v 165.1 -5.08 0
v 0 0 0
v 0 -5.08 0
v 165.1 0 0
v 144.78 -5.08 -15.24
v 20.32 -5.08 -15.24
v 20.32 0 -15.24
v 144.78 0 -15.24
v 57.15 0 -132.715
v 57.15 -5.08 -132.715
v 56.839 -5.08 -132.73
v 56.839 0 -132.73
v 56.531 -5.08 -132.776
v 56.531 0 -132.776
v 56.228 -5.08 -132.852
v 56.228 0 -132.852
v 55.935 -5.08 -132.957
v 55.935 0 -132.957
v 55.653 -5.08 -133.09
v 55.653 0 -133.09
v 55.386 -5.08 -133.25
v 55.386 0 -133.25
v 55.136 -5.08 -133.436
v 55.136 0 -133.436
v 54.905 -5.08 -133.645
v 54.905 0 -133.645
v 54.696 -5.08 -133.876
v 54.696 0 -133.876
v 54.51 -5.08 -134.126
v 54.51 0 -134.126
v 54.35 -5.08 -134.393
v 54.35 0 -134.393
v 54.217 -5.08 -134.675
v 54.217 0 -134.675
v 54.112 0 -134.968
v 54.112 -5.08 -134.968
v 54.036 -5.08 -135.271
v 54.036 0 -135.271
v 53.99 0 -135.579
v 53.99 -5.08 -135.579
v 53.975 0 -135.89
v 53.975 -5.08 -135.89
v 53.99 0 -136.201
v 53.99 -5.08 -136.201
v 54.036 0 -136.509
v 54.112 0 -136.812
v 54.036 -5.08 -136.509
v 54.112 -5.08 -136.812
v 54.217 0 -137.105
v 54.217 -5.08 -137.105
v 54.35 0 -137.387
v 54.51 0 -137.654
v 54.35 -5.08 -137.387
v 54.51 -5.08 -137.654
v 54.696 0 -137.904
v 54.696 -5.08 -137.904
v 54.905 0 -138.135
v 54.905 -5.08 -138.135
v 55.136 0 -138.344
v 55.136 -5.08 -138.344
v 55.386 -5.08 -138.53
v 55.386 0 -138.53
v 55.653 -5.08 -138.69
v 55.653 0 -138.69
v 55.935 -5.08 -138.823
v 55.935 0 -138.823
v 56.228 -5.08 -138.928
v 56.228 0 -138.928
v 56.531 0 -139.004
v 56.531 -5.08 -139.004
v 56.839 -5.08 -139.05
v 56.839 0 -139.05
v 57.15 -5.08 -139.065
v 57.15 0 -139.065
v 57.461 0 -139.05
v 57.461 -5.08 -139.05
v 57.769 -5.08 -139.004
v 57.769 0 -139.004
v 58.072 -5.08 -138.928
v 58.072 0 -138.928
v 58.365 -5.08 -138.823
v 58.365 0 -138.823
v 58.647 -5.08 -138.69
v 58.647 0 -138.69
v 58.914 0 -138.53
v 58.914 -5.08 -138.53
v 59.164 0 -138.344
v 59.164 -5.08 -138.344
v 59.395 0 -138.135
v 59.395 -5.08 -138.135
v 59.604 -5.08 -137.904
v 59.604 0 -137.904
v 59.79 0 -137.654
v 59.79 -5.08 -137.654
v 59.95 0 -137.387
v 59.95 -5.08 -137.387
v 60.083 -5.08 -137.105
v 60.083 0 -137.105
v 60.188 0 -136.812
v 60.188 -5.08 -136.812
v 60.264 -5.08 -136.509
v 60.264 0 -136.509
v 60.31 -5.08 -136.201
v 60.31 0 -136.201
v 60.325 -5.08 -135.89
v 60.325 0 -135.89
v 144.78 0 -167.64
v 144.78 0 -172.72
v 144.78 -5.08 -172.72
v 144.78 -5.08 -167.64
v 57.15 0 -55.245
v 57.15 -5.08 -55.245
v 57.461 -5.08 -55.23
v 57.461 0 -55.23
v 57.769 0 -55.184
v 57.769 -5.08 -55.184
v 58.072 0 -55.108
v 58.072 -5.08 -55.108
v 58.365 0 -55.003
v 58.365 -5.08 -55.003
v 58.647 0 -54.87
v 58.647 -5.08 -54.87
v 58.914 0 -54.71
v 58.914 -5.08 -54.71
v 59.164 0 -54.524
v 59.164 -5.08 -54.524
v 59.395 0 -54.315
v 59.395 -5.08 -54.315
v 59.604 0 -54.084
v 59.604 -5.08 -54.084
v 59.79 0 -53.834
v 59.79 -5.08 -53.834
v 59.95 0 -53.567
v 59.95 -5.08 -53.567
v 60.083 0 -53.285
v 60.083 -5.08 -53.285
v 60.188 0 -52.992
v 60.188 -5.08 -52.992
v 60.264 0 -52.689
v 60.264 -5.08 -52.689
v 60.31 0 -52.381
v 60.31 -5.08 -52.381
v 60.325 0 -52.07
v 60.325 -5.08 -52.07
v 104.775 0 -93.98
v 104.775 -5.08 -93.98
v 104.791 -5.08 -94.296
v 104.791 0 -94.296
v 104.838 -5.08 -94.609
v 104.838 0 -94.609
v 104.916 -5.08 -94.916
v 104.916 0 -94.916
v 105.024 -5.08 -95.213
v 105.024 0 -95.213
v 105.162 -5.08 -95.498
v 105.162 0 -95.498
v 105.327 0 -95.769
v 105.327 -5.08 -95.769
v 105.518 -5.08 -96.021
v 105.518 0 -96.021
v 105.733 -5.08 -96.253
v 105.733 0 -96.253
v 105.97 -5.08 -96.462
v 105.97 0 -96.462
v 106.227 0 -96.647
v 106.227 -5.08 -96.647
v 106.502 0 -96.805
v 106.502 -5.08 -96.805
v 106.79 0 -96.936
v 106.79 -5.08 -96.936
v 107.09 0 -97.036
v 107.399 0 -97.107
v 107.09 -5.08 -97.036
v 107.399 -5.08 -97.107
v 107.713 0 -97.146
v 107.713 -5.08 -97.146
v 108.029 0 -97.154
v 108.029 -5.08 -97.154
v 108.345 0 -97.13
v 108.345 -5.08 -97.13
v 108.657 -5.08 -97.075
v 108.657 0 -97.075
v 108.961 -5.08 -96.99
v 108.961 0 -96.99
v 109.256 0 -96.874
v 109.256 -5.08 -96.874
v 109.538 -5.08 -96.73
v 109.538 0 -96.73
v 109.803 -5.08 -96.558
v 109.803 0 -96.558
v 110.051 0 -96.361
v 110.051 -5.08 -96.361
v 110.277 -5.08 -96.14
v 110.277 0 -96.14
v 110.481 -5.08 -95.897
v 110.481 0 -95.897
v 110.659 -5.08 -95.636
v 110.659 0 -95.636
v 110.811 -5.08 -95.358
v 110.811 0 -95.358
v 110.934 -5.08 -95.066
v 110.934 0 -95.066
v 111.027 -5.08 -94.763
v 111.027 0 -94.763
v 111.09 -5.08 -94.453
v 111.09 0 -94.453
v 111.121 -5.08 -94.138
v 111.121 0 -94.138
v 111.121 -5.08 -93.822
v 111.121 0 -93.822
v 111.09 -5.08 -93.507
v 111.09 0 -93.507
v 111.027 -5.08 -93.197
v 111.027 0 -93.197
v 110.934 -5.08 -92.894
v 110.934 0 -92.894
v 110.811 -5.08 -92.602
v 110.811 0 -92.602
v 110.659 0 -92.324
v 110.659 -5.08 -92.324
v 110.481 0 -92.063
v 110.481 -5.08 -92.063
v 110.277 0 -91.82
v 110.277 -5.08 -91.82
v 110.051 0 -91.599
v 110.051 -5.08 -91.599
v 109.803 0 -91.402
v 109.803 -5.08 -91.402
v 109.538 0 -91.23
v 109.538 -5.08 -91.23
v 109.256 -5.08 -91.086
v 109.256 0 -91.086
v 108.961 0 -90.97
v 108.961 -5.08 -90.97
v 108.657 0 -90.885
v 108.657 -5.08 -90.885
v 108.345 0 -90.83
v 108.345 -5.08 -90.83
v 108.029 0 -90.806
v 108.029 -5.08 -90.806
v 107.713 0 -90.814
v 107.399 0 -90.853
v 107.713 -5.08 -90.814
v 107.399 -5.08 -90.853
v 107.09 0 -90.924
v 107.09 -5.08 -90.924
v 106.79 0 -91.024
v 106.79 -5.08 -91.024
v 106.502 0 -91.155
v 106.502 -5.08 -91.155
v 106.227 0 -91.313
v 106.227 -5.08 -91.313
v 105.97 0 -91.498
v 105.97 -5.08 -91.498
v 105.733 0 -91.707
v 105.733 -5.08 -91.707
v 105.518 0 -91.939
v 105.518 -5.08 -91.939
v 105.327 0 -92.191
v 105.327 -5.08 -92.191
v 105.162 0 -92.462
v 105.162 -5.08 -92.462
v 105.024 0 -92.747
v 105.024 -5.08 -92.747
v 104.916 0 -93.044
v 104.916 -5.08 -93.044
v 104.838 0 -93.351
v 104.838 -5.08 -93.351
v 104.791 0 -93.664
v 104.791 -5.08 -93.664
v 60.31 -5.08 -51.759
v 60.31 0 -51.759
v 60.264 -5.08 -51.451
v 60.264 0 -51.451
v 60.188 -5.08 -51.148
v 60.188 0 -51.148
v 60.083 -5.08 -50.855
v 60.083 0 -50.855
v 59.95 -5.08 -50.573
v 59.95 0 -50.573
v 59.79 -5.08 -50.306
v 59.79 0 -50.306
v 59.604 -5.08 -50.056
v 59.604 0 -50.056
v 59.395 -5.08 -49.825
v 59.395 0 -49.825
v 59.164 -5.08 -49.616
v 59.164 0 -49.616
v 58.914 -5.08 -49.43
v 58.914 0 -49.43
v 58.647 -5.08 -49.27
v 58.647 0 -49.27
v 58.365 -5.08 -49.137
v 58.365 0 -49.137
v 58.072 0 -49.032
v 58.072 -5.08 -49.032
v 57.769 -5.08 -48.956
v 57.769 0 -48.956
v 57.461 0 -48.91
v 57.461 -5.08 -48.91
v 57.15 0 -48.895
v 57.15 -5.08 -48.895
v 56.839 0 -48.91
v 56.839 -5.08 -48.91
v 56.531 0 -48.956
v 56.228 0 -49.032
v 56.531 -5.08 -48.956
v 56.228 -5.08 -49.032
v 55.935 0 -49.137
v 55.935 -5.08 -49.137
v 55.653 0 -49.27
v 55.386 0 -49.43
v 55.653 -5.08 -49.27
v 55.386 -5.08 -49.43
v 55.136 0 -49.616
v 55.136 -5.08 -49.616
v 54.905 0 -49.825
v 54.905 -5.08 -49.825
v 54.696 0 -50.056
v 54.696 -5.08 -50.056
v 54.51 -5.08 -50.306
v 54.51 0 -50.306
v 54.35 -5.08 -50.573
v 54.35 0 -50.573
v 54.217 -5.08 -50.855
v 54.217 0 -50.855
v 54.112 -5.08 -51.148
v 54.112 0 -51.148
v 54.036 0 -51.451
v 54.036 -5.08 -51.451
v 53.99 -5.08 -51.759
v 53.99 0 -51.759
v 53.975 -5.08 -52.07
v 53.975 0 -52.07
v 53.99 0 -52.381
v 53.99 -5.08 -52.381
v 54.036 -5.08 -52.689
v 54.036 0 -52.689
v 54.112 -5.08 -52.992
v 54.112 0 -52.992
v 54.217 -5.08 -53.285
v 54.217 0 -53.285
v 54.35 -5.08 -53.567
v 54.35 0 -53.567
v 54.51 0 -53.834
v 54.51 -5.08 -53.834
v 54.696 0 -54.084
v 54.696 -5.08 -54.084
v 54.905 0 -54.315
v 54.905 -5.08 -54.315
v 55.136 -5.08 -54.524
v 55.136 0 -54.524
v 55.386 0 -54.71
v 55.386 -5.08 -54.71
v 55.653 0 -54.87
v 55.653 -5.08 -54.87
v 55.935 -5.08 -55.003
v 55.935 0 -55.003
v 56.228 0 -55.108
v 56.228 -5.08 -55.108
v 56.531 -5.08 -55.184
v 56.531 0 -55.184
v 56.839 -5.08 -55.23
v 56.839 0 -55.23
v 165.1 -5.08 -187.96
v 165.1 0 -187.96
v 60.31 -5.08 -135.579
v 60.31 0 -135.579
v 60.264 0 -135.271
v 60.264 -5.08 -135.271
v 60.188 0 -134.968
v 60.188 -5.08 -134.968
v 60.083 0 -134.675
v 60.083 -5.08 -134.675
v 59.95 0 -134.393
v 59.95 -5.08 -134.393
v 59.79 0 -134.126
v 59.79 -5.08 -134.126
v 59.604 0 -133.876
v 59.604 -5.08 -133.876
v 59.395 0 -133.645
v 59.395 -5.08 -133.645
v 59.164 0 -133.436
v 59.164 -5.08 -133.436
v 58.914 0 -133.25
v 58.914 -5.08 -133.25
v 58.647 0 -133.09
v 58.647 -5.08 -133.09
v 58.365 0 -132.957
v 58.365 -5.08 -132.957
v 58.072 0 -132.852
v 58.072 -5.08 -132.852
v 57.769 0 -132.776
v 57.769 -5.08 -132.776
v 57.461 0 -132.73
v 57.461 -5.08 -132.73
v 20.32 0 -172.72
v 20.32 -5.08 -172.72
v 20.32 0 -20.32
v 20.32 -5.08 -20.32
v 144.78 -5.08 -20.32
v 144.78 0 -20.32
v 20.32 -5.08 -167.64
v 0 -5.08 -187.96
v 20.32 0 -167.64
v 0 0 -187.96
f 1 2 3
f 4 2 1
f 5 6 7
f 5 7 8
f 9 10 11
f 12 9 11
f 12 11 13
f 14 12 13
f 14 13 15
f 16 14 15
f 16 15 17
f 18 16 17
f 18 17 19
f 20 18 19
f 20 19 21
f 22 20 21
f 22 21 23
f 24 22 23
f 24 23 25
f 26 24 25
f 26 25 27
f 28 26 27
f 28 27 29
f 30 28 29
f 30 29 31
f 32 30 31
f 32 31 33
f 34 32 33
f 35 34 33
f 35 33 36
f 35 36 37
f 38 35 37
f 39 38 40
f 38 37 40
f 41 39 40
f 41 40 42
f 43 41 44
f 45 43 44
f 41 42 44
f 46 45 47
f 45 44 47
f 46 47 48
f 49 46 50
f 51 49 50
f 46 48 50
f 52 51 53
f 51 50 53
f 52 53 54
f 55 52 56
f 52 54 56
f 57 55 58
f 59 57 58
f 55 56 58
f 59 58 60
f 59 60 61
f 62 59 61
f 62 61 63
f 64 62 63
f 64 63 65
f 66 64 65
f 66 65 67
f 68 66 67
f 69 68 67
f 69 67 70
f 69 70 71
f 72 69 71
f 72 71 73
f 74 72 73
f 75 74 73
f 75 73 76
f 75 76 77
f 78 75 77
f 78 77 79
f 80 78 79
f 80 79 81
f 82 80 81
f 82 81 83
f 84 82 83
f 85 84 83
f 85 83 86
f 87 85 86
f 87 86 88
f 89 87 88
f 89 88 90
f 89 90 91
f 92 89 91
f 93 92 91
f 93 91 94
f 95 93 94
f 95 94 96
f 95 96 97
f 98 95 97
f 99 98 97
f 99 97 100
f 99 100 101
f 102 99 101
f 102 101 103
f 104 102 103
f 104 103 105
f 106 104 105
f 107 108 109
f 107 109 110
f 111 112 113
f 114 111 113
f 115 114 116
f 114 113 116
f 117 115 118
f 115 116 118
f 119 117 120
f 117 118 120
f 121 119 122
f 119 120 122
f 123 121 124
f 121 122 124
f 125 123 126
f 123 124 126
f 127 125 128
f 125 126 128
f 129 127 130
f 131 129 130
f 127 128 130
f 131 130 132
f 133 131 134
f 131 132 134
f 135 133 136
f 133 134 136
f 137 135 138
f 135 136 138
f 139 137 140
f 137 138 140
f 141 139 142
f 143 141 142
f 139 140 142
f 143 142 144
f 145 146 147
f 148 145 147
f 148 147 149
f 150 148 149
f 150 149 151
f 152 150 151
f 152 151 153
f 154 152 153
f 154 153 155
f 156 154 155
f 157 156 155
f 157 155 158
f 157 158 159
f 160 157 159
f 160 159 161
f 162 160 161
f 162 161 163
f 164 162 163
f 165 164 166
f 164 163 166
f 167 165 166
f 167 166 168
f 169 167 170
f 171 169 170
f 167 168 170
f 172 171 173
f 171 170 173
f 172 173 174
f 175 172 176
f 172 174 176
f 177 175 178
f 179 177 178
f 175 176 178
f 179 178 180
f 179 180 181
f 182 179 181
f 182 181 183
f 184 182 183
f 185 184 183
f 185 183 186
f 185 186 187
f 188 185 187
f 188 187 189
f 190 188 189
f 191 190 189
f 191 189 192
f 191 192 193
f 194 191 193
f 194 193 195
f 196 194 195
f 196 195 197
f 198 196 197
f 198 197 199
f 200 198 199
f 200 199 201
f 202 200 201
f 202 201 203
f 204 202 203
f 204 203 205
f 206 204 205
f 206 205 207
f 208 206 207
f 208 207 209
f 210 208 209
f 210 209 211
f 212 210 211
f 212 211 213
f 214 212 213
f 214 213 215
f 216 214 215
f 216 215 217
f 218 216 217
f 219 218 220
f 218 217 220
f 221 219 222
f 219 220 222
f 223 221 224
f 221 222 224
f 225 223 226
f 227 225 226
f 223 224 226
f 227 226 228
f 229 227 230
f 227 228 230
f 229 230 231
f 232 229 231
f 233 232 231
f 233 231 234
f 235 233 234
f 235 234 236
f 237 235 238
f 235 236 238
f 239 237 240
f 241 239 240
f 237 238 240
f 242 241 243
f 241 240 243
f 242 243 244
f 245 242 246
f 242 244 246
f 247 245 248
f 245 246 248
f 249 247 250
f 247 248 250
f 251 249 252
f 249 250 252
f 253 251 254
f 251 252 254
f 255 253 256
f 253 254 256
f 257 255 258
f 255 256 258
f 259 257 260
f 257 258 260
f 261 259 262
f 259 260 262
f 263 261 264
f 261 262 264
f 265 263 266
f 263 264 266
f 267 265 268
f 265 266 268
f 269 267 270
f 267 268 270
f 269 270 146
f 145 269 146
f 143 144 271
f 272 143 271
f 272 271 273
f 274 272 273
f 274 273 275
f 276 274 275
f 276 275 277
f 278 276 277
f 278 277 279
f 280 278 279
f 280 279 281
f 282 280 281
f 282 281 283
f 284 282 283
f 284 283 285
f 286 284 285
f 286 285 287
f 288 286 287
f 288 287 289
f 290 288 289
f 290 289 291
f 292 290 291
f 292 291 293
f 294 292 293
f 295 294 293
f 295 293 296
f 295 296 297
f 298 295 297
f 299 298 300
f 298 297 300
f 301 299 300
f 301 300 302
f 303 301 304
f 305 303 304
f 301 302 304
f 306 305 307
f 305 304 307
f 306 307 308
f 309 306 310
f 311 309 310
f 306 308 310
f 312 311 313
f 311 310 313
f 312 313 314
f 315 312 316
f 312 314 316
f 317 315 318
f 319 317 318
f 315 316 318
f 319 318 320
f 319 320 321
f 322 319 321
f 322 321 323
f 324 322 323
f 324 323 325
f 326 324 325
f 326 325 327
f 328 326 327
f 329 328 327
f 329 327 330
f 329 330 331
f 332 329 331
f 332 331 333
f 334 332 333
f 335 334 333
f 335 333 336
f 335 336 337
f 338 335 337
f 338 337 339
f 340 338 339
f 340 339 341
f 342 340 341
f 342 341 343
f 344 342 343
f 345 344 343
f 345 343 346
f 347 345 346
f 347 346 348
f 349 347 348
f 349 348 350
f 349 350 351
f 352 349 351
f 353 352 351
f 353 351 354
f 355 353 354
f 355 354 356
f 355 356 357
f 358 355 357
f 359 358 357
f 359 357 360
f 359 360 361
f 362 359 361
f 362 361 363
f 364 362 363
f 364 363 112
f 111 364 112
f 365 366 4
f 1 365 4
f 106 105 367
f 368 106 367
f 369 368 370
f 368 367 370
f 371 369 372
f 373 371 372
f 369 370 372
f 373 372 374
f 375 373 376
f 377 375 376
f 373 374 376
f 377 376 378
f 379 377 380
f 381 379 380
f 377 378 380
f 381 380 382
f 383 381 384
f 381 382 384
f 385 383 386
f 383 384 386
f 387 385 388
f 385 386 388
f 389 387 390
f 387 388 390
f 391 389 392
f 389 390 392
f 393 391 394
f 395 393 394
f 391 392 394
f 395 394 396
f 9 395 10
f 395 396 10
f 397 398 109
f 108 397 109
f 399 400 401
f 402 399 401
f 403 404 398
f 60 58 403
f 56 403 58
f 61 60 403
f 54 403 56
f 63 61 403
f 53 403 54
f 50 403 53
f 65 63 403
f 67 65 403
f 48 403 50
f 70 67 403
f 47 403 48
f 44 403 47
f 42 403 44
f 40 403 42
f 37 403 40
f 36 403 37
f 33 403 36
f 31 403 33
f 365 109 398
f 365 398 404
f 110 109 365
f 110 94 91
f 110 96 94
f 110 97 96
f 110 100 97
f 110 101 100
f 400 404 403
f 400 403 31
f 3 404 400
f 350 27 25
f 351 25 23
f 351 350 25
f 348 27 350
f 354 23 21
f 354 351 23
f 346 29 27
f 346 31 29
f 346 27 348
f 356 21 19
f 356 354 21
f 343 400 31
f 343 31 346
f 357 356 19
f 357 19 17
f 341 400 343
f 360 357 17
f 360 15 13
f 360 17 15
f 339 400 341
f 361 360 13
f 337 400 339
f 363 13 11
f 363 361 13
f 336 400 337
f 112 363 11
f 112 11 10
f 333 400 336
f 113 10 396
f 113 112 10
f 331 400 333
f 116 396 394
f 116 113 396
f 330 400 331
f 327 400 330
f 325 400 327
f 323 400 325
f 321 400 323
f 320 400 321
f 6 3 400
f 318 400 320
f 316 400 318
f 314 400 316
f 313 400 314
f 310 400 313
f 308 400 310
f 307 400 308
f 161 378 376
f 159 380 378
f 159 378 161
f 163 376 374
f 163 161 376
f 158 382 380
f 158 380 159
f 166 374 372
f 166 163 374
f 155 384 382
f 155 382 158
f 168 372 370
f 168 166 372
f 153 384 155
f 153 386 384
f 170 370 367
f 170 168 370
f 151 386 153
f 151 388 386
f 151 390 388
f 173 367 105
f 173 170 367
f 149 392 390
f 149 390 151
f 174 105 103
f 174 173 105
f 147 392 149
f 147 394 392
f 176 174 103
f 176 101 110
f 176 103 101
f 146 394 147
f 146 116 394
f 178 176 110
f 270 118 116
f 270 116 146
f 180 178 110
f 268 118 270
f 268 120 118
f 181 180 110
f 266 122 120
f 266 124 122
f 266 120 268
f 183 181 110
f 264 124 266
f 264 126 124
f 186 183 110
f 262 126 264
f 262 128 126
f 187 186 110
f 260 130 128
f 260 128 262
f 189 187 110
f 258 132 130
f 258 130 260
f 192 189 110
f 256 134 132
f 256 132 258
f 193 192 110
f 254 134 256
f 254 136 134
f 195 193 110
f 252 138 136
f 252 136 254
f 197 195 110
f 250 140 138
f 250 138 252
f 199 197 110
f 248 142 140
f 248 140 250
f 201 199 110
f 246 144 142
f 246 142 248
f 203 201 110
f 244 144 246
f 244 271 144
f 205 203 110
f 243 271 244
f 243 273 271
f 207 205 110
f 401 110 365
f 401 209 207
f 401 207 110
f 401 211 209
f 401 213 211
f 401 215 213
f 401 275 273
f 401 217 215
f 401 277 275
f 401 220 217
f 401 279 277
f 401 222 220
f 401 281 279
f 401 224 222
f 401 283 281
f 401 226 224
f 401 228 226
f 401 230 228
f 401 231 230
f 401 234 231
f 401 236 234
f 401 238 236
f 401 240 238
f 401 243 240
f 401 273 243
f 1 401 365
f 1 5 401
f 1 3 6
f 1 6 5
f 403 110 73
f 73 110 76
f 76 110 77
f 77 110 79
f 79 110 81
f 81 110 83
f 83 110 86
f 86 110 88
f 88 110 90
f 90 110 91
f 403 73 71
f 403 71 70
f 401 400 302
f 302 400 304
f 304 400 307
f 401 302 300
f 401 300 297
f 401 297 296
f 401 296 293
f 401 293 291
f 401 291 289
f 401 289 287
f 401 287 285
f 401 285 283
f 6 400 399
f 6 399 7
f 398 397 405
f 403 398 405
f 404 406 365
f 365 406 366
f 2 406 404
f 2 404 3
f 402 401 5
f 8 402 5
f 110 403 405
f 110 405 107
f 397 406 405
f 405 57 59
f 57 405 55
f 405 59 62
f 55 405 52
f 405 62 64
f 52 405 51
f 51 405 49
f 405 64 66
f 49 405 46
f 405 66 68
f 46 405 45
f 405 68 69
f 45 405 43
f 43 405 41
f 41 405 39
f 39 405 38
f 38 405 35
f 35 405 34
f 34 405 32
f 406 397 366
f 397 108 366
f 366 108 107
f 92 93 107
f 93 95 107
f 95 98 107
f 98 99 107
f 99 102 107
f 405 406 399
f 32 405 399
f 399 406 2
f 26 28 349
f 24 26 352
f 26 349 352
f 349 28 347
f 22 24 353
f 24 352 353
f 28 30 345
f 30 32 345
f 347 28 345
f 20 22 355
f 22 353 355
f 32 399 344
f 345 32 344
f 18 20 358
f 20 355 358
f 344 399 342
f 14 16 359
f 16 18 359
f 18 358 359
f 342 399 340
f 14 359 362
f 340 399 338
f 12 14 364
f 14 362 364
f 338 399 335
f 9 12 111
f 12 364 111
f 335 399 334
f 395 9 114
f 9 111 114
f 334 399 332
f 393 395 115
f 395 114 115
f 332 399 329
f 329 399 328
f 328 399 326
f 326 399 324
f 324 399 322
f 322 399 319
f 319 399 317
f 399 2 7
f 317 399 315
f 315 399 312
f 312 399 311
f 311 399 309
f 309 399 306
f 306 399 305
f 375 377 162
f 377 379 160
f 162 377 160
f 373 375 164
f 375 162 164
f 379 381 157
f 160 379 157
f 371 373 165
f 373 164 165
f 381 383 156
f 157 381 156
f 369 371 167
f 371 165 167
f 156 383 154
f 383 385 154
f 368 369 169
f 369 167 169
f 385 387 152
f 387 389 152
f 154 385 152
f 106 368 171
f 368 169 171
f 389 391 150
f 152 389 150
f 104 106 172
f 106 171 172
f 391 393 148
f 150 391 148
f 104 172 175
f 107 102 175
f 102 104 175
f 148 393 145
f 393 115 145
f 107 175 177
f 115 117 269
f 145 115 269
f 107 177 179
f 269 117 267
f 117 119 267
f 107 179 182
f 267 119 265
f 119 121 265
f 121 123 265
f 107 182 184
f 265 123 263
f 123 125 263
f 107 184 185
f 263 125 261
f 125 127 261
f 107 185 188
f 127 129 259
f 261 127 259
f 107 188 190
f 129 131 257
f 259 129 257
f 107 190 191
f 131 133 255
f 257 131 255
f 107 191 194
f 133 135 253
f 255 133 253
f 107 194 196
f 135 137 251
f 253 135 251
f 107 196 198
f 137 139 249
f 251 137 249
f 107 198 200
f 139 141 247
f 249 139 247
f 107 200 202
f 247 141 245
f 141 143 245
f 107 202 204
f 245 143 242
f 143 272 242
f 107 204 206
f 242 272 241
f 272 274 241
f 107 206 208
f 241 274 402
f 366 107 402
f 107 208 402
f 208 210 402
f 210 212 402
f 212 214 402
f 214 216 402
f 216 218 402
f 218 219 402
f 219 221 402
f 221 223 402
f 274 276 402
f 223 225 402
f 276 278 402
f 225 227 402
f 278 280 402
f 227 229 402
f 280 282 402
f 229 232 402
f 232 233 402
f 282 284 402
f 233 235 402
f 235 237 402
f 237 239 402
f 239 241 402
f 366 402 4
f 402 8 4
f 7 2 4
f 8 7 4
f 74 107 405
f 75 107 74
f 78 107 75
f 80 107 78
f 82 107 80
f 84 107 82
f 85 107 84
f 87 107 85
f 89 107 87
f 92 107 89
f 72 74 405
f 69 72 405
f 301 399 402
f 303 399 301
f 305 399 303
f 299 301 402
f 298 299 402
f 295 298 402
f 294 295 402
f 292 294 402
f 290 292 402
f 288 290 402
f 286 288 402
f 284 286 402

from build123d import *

# Parameters (mm, degrees)
F0_W     = 165.1
F0_H     = 187.96
F1_DEPTH = 5.08
F2_W     = 124.46
F2_H     = 5.08
F3_DEPTH = 25.4
F5_DEPTH = 25.4


with BuildPart() as f1:
    # F0 (on Front) → F1 (new body)
    with BuildSketch(Plane.XZ):
        with Locations((82.55, -93.98)):
            Rectangle(F0_W, F0_H)
    extrude(amount=F1_DEPTH)

    # F2 (on face) → F3 (cut)
    with BuildSketch(Plane.XZ.offset(5.08)):
        with Locations((82.55, -17.78)):
            Rectangle(F2_W, F2_H)
        with Locations((82.55, -170.18)):
            Rectangle(F2_W, F2_H)
    extrude(amount=-F3_DEPTH, mode=Mode.SUBTRACT)

    # F4 (on face) → F5 (cut)
    with BuildSketch(Plane.XZ.offset(5.08)):
        with BuildLine():
            ThreePointArc((111.125, -93.98), (107.95, -90.805), (104.775, -93.98))
            ThreePointArc((104.775, -93.98), (107.95, -97.155), (111.125, -93.98))
        make_face()
        with BuildLine():
            ThreePointArc((60.325, -135.89), (59.395064, -133.644936), (57.15, -132.715))
            ThreePointArc((57.15, -132.715), (54.904936, -138.135064), (60.325, -135.89))
        make_face()
        with BuildLine():
            ThreePointArc((60.325, -52.07), (54.904936, -49.824936), (57.15, -55.245))
            ThreePointArc((57.15, -55.245), (59.395064, -54.315064), (60.325, -52.07))
        make_face()
    extrude(amount=-F5_DEPTH, mode=Mode.SUBTRACT)


solid = f1.part
